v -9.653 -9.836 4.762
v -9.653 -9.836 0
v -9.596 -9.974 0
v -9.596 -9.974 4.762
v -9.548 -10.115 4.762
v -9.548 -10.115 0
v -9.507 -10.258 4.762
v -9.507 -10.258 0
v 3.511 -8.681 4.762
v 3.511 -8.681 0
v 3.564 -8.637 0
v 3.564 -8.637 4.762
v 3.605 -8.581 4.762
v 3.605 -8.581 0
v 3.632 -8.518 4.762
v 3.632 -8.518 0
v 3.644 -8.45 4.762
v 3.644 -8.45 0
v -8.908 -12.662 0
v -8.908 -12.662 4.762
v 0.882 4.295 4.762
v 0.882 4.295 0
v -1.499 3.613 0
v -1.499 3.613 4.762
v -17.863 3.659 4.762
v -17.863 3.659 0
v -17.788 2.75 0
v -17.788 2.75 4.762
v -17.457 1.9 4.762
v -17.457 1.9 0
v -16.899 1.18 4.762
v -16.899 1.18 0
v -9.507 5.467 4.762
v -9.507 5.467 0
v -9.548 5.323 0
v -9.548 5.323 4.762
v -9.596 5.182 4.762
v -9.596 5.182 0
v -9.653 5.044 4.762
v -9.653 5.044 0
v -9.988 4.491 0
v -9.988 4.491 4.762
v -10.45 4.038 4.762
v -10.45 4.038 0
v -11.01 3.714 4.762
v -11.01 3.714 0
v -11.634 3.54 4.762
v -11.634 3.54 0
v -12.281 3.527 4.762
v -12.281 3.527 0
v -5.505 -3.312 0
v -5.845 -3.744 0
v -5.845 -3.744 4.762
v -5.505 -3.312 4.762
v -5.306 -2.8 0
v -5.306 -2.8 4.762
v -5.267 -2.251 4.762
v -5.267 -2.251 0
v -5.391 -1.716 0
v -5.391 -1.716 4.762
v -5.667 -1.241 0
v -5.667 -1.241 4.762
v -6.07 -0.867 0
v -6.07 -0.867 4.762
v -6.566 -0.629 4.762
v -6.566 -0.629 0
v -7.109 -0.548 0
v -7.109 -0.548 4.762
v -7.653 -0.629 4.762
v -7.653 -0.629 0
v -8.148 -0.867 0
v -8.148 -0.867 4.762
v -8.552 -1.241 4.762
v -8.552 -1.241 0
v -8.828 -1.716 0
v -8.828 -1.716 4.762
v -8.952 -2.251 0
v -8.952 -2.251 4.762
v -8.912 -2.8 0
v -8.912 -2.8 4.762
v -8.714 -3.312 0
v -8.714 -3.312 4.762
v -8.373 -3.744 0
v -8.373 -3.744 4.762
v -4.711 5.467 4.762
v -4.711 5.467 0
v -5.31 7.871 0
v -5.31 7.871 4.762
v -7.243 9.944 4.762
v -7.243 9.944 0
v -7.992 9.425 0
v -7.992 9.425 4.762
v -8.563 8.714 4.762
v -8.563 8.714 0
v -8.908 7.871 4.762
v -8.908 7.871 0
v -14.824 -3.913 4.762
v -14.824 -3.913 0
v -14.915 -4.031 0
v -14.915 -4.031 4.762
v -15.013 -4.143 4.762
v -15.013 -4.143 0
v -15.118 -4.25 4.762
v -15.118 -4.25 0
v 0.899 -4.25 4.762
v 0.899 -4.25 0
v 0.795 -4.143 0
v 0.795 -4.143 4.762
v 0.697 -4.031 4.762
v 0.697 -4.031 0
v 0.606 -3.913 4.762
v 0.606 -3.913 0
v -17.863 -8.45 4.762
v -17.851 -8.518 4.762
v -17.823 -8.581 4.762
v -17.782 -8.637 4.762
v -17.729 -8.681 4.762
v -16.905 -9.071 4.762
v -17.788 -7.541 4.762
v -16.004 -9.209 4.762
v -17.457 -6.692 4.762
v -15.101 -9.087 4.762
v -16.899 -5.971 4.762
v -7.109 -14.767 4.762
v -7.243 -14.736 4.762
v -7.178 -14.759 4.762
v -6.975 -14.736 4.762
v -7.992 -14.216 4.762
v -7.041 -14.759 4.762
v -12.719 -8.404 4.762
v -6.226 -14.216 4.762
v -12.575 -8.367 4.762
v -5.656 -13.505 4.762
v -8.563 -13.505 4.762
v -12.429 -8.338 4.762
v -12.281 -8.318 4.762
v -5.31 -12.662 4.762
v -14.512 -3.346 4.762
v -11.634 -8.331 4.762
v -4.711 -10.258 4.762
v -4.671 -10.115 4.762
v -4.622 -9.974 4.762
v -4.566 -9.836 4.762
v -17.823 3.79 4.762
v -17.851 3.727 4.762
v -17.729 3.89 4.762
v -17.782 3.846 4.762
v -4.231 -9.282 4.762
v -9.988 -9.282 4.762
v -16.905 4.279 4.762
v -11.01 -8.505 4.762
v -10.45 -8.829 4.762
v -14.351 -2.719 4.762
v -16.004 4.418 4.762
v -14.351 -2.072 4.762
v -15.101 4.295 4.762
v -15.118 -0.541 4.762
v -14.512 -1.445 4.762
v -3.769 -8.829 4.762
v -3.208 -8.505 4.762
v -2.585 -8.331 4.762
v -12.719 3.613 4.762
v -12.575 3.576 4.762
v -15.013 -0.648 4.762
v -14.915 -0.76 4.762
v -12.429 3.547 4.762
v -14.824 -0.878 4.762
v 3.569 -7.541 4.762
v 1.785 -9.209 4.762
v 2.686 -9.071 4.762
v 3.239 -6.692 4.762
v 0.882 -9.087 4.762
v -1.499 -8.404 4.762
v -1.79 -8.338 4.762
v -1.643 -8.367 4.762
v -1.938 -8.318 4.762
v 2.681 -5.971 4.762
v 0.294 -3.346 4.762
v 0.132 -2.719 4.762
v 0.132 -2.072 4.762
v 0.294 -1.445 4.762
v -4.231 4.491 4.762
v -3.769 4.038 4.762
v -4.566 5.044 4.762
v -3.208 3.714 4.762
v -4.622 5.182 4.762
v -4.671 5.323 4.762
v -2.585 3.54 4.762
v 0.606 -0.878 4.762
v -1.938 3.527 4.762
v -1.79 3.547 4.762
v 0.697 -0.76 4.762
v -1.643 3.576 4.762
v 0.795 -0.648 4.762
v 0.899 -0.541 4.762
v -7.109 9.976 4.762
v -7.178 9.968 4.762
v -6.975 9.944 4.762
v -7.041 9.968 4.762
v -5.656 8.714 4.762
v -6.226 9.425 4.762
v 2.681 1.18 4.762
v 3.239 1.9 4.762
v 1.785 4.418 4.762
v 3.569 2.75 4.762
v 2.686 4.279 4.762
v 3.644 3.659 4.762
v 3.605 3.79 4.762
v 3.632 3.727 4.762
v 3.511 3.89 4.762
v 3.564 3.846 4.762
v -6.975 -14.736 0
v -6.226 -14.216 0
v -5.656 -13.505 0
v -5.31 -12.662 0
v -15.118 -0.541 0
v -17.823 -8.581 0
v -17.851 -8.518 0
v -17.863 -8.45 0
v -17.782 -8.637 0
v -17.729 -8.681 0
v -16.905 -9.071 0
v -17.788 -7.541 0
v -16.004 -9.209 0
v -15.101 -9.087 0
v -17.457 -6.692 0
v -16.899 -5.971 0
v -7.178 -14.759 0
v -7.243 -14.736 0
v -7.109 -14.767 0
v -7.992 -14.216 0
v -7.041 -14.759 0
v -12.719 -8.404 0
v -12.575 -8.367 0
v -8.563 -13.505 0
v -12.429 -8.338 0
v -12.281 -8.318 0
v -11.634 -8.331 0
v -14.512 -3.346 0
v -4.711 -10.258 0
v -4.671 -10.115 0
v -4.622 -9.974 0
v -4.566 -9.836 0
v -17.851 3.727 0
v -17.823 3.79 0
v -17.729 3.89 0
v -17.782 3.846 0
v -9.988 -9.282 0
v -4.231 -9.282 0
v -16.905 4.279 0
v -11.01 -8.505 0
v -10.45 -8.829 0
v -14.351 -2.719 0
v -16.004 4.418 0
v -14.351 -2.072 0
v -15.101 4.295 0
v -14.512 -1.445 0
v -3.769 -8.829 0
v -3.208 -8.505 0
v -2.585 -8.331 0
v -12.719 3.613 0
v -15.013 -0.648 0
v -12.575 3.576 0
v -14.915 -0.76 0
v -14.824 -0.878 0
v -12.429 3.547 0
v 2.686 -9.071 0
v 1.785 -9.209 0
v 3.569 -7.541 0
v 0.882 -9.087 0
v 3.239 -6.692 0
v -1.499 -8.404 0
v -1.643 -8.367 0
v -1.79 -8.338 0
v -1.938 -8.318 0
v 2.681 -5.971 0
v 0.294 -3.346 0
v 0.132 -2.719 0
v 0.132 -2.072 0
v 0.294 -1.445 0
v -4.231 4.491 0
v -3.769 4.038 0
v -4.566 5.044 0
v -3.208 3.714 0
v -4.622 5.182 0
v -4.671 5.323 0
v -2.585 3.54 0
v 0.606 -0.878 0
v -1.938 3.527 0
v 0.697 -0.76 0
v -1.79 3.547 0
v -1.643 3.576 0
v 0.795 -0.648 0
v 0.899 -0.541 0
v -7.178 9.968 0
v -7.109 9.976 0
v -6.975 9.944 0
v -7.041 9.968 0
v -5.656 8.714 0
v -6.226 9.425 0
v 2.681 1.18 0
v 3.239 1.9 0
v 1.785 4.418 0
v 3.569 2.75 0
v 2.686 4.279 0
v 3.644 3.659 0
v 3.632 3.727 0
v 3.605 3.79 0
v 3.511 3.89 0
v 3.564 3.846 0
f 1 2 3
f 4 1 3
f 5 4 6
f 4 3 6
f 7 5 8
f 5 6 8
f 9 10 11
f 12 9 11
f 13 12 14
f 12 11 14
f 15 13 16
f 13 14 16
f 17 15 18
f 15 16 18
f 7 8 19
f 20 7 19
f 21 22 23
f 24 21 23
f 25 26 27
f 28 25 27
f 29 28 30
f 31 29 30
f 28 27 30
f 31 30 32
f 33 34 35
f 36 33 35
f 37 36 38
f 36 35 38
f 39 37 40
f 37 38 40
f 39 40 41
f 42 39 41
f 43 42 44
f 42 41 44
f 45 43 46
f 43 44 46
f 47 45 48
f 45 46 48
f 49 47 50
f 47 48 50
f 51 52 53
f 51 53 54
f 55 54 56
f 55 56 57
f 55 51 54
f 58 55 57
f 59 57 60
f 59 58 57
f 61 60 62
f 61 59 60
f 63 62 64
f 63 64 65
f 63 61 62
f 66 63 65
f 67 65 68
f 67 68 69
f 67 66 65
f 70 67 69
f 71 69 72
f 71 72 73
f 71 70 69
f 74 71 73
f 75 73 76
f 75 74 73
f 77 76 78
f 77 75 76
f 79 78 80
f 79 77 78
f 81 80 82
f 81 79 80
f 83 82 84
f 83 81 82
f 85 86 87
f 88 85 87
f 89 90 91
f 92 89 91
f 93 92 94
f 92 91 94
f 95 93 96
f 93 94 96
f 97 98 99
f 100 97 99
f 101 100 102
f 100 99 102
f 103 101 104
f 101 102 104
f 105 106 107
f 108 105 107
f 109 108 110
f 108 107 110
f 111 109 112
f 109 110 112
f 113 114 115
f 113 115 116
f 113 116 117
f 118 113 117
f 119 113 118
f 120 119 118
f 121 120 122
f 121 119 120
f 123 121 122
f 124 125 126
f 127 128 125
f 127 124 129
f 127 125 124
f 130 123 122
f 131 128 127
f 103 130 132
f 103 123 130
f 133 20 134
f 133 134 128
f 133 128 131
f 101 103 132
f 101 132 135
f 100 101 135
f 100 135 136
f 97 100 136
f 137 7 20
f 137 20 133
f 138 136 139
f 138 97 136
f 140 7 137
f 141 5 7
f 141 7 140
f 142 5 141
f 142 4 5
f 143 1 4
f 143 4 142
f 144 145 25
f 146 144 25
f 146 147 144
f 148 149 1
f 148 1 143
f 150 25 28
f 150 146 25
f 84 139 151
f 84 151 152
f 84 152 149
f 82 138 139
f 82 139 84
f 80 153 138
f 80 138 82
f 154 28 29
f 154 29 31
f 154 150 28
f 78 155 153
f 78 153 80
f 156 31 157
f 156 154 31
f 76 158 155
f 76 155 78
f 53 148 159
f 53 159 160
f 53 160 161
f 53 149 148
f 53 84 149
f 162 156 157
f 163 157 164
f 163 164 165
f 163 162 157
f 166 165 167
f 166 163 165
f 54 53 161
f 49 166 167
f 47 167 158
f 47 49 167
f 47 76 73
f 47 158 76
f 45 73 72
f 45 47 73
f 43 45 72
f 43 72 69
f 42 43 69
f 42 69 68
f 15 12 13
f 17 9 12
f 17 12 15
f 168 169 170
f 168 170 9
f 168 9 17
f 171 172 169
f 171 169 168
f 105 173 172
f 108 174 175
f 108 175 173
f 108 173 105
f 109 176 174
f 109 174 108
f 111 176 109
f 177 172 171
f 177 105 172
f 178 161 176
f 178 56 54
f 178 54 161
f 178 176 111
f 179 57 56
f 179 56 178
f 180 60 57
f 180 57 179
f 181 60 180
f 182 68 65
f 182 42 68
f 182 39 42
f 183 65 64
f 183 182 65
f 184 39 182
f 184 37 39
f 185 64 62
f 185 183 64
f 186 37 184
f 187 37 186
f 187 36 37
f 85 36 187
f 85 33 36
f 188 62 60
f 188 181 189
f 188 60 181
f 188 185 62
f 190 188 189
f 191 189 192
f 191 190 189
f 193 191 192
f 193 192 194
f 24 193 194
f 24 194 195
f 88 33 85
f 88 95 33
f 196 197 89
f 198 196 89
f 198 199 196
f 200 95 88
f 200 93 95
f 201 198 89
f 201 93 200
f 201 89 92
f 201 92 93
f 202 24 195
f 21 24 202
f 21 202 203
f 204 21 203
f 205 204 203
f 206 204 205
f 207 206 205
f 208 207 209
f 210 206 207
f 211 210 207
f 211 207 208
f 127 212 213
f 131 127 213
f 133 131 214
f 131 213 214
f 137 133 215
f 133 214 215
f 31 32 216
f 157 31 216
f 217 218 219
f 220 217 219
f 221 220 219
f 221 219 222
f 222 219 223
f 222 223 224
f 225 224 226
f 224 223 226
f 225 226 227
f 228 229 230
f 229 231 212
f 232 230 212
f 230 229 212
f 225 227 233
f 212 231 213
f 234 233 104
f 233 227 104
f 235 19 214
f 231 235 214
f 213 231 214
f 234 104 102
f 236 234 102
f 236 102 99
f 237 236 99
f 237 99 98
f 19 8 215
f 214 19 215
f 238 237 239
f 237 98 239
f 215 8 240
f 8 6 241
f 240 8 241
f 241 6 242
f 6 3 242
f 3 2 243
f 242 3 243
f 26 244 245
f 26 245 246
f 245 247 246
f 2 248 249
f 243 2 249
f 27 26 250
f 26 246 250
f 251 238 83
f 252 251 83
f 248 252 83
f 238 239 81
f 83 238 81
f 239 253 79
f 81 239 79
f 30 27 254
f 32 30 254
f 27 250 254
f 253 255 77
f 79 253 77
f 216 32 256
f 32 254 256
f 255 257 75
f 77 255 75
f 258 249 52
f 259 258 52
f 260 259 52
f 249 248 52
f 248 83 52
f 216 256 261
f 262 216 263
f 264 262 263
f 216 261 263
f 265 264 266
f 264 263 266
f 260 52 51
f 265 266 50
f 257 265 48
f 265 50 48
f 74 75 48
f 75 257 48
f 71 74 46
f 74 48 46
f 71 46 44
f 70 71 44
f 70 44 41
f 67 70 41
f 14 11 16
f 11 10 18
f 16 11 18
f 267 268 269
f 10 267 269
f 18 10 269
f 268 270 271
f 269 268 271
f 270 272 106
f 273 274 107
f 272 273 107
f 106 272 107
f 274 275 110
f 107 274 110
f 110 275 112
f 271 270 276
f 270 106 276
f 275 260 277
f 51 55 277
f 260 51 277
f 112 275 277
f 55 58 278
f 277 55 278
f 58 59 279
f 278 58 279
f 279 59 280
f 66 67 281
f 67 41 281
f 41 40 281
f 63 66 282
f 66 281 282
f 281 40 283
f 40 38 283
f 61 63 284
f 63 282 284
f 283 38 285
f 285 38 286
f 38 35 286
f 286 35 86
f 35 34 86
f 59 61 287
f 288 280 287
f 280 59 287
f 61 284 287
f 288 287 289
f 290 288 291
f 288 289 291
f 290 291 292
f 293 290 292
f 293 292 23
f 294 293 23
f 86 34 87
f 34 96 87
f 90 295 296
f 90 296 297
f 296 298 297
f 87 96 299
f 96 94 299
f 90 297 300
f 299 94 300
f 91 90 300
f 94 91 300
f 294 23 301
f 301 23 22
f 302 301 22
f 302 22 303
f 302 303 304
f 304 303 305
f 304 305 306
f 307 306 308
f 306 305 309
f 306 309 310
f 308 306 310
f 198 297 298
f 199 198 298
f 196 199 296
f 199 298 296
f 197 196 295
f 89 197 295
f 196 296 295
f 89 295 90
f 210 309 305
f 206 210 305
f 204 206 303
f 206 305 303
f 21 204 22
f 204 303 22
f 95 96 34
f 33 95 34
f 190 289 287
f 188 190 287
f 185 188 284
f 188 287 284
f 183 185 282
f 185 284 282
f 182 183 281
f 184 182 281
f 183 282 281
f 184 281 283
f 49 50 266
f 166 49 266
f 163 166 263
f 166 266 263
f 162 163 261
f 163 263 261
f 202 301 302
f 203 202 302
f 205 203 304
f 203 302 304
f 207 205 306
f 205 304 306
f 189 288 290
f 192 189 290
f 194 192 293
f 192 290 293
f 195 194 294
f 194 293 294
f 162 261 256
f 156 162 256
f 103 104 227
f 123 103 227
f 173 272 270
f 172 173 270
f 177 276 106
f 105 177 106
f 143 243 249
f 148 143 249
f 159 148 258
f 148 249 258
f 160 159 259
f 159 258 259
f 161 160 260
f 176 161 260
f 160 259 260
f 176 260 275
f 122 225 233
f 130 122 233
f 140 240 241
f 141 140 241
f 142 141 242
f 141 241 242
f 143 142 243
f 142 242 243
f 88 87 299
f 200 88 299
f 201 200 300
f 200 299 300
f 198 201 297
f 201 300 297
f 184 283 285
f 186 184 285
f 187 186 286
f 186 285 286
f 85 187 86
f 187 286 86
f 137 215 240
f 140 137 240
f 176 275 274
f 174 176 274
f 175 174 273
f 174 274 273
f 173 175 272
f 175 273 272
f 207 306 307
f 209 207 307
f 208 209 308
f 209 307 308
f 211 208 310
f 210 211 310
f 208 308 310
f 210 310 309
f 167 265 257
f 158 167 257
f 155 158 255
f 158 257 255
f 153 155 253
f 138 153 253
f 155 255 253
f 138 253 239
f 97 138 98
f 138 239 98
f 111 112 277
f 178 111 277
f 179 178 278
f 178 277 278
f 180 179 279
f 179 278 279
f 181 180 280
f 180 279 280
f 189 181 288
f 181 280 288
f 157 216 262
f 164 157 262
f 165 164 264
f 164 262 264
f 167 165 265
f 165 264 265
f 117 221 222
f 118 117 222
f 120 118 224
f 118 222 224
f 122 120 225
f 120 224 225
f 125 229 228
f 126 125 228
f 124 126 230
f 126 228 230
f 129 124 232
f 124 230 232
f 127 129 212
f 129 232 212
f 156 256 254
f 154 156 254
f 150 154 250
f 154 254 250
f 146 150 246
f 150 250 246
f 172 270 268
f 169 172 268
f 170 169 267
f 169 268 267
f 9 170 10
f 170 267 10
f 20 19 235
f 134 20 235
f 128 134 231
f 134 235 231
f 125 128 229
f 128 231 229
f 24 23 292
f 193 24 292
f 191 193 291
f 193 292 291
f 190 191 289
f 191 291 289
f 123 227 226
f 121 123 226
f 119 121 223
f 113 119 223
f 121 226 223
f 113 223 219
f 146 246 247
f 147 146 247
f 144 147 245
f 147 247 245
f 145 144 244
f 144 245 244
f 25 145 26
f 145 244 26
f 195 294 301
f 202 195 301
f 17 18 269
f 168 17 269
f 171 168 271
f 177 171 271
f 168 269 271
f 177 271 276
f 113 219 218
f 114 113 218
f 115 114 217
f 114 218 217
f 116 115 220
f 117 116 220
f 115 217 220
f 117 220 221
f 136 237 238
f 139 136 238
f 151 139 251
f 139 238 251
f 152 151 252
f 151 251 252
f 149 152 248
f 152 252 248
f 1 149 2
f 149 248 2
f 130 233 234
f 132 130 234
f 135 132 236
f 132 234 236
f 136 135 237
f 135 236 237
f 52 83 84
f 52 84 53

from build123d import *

# Parameters (mm, degrees)
BOSS_EXTRUDE1_DEPTH = 4.7625
BOSS_EXTRUDE2_START = -4.7625
BOSS_EXTRUDE2_DEPTH = 4.7625


with BuildPart() as part:
    # Sketch1 → Boss-Extrude1 (new body)
    with BuildSketch(Plane.XY):
        with BuildLine():
            Line((-9.507346898, -10.258391726), (-8.908113007, -12.661787593))
            ThreePointArc((-8.908113007, -12.661787593), (-8.303157018, -13.881491249), (-7.2429575, -14.735672577))
            ThreePointArc((-7.2429575, -14.735672577), (-7.10920631, -14.767138372), (-6.975455121, -14.735672577))
            ThreePointArc((-6.975455121, -14.735672577), (-5.915255603, -13.881491249), (-5.310299614, -12.661787593))
            Line((-5.310299614, -12.661787593), (-4.711065722, -10.258391726))
            ThreePointArc((-4.711065722, -10.258391726), (-4.647570891, -10.043856855), (-4.565714834, -9.835634882))
            ThreePointArc((-4.565714834, -9.835634882), (-3.49859631, -8.649390472), (-1.937719254, -8.318360926))
            ThreePointArc((-1.937719254, -8.318360926), (-1.716465707, -8.351582488), (-1.498925643, -8.403861787))
            Line((-1.498925643, -8.403861787), (0.882093179, -9.086607947))
            ThreePointArc((0.882093179, -9.086607947), (2.240865525, -9.172552521), (3.510708013, -8.681483469))
            ThreePointArc((3.510708013, -8.681483469), (3.604833786, -8.581384439), (3.644459203, -8.449819613))
            ThreePointArc((3.644459203, -8.449819613), (3.434816232, -7.104569234), (2.680999875, -5.970810151))
            Line((2.680999875, -5.970810151), (0.899214945, -4.250160445))
            ThreePointArc((0.899214945, -4.250160445), (0.745169712, -4.087904873), (0.605772222, -3.912904461))
            ThreePointArc((0.605772222, -3.912904461), (0.11201369, -2.395630505), (0.605772222, -0.878356549))
            ThreePointArc((0.605772222, -0.878356549), (0.745169712, -0.703356138), (0.899214945, -0.541100566))
            Line((0.899214945, -0.541100566), (2.680999444, 1.179548724))
            ThreePointArc((2.680999444, 1.179548724), (3.434816124, 2.313307944), (3.644459203, 3.658558603))
            ThreePointArc((3.644459203, 3.658558603), (3.604833786, 3.790123428), (3.510708013, 3.890222459))
            ThreePointArc((3.510708013, 3.890222459), (2.240865525, 4.38129151), (0.882093179, 4.295346937))
            Line((0.882093179, 4.295346937), (-1.498925643, 3.612600776))
            ThreePointArc((-1.498925643, 3.612600776), (-1.716465707, 3.560321477), (-1.937719254, 3.527099916))
            ThreePointArc((-1.937719254, 3.527099916), (-3.49859631, 3.858129461), (-4.565714834, 5.044373871))
            ThreePointArc((-4.565714834, 5.044373871), (-4.647570891, 5.252595845), (-4.711065722, 5.467130715))
            Line((-4.711065722, 5.467130715), (-5.310299614, 7.870526582))
            ThreePointArc((-5.310299614, 7.870526582), (-5.915255603, 9.090230239), (-6.975455121, 9.944411567))
            ThreePointArc((-6.975455121, 9.944411567), (-7.10920631, 9.975877362), (-7.2429575, 9.944411567))
            ThreePointArc((-7.2429575, 9.944411567), (-8.303157018, 9.090230239), (-8.908113007, 7.870526582))
            Line((-8.908113007, 7.870526582), (-9.507346898, 5.467130715))
            ThreePointArc((-9.507346898, 5.467130715), (-9.570841729, 5.252595845), (-9.652697786, 5.044373871))
            ThreePointArc((-9.652697786, 5.044373871), (-10.71981631, 3.858129461), (-12.280693367, 3.527099916))
            ThreePointArc((-12.280693367, 3.527099916), (-12.501946914, 3.560321477), (-12.719486977, 3.612600776))
            Line((-12.719486977, 3.612600776), (-15.100505799, 4.295346937))
            ThreePointArc((-15.100505799, 4.295346937), (-16.459278145, 4.38129151), (-17.729120634, 3.890222459))
            ThreePointArc((-17.729120634, 3.890222459), (-17.823246406, 3.790123428), (-17.862871823, 3.658558603))
            ThreePointArc((-17.862871823, 3.658558603), (-17.653228853, 2.313308223), (-16.899412496, 1.17954914))
            Line((-16.899412496, 1.17954914), (-15.117627565, -0.541100566))
            ThreePointArc((-15.117627565, -0.541100566), (-14.963582333, -0.703356138), (-14.824184843, -0.878356549))
            ThreePointArc((-14.824184843, -0.878356549), (-14.33042631, -2.395630505), (-14.824184843, -3.912904461))
            ThreePointArc((-14.824184843, -3.912904461), (-14.963582333, -4.087904873), (-15.117627565, -4.250160445))
            Line((-15.117627565, -4.250160445), (-16.899412065, -5.970809735))
            ThreePointArc((-16.899412065, -5.970809735), (-17.653228744, -7.104568955), (-17.862871823, -8.449819613))
            ThreePointArc((-17.862871823, -8.449819613), (-17.823246406, -8.581384439), (-17.729120634, -8.681483469))
            ThreePointArc((-17.729120634, -8.681483469), (-16.459278145, -9.172552521), (-15.100505799, -9.086607947))
            Line((-15.100505799, -9.086607947), (-12.719486977, -8.403861787))
            ThreePointArc((-12.719486977, -8.403861787), (-12.501946914, -8.351582488), (-12.280693367, -8.318360926))
            ThreePointArc((-12.280693367, -8.318360926), (-10.71981631, -8.649390472), (-9.652697786, -9.835634882))
            ThreePointArc((-9.652697786, -9.835634882), (-9.570841729, -10.043856855), (-9.507346898, -10.258391726))
        make_face()
        with BuildLine():
            Line((-5.795813757, -3.870630505), (-8.422598864, -3.870630505))
            ThreePointArc((-8.422598864, -3.870630505), (-7.10920631, -0.420630505), (-5.795813757, -3.870630505))
        make_face(mode=Mode.SUBTRACT)
    extrude(amount=BOSS_EXTRUDE1_DEPTH)

    # Sketch4 → Boss-Extrude2 (add)
    with BuildSketch(Plane.XY.offset(4.7625).offset(BOSS_EXTRUDE2_START)):
        with BuildLine():
            Line((-8.422598864, -3.870630505), (-5.795813757, -3.870630505))
            ThreePointArc((-5.795813757, -3.870630505), (-7.10920631, -0.420630505), (-8.422598864, -3.870630505))
        make_face()
        with BuildLine():
            Line((-8.373326558, -3.743630505), (-5.845086063, -3.743630505))
            ThreePointArc((-5.845086063, -3.743630505), (-7.10920631, -0.547630505), (-8.373326558, -3.743630505))
        make_face(mode=Mode.SUBTRACT)
    extrude(amount=BOSS_EXTRUDE2_DEPTH)


solid = part.part
